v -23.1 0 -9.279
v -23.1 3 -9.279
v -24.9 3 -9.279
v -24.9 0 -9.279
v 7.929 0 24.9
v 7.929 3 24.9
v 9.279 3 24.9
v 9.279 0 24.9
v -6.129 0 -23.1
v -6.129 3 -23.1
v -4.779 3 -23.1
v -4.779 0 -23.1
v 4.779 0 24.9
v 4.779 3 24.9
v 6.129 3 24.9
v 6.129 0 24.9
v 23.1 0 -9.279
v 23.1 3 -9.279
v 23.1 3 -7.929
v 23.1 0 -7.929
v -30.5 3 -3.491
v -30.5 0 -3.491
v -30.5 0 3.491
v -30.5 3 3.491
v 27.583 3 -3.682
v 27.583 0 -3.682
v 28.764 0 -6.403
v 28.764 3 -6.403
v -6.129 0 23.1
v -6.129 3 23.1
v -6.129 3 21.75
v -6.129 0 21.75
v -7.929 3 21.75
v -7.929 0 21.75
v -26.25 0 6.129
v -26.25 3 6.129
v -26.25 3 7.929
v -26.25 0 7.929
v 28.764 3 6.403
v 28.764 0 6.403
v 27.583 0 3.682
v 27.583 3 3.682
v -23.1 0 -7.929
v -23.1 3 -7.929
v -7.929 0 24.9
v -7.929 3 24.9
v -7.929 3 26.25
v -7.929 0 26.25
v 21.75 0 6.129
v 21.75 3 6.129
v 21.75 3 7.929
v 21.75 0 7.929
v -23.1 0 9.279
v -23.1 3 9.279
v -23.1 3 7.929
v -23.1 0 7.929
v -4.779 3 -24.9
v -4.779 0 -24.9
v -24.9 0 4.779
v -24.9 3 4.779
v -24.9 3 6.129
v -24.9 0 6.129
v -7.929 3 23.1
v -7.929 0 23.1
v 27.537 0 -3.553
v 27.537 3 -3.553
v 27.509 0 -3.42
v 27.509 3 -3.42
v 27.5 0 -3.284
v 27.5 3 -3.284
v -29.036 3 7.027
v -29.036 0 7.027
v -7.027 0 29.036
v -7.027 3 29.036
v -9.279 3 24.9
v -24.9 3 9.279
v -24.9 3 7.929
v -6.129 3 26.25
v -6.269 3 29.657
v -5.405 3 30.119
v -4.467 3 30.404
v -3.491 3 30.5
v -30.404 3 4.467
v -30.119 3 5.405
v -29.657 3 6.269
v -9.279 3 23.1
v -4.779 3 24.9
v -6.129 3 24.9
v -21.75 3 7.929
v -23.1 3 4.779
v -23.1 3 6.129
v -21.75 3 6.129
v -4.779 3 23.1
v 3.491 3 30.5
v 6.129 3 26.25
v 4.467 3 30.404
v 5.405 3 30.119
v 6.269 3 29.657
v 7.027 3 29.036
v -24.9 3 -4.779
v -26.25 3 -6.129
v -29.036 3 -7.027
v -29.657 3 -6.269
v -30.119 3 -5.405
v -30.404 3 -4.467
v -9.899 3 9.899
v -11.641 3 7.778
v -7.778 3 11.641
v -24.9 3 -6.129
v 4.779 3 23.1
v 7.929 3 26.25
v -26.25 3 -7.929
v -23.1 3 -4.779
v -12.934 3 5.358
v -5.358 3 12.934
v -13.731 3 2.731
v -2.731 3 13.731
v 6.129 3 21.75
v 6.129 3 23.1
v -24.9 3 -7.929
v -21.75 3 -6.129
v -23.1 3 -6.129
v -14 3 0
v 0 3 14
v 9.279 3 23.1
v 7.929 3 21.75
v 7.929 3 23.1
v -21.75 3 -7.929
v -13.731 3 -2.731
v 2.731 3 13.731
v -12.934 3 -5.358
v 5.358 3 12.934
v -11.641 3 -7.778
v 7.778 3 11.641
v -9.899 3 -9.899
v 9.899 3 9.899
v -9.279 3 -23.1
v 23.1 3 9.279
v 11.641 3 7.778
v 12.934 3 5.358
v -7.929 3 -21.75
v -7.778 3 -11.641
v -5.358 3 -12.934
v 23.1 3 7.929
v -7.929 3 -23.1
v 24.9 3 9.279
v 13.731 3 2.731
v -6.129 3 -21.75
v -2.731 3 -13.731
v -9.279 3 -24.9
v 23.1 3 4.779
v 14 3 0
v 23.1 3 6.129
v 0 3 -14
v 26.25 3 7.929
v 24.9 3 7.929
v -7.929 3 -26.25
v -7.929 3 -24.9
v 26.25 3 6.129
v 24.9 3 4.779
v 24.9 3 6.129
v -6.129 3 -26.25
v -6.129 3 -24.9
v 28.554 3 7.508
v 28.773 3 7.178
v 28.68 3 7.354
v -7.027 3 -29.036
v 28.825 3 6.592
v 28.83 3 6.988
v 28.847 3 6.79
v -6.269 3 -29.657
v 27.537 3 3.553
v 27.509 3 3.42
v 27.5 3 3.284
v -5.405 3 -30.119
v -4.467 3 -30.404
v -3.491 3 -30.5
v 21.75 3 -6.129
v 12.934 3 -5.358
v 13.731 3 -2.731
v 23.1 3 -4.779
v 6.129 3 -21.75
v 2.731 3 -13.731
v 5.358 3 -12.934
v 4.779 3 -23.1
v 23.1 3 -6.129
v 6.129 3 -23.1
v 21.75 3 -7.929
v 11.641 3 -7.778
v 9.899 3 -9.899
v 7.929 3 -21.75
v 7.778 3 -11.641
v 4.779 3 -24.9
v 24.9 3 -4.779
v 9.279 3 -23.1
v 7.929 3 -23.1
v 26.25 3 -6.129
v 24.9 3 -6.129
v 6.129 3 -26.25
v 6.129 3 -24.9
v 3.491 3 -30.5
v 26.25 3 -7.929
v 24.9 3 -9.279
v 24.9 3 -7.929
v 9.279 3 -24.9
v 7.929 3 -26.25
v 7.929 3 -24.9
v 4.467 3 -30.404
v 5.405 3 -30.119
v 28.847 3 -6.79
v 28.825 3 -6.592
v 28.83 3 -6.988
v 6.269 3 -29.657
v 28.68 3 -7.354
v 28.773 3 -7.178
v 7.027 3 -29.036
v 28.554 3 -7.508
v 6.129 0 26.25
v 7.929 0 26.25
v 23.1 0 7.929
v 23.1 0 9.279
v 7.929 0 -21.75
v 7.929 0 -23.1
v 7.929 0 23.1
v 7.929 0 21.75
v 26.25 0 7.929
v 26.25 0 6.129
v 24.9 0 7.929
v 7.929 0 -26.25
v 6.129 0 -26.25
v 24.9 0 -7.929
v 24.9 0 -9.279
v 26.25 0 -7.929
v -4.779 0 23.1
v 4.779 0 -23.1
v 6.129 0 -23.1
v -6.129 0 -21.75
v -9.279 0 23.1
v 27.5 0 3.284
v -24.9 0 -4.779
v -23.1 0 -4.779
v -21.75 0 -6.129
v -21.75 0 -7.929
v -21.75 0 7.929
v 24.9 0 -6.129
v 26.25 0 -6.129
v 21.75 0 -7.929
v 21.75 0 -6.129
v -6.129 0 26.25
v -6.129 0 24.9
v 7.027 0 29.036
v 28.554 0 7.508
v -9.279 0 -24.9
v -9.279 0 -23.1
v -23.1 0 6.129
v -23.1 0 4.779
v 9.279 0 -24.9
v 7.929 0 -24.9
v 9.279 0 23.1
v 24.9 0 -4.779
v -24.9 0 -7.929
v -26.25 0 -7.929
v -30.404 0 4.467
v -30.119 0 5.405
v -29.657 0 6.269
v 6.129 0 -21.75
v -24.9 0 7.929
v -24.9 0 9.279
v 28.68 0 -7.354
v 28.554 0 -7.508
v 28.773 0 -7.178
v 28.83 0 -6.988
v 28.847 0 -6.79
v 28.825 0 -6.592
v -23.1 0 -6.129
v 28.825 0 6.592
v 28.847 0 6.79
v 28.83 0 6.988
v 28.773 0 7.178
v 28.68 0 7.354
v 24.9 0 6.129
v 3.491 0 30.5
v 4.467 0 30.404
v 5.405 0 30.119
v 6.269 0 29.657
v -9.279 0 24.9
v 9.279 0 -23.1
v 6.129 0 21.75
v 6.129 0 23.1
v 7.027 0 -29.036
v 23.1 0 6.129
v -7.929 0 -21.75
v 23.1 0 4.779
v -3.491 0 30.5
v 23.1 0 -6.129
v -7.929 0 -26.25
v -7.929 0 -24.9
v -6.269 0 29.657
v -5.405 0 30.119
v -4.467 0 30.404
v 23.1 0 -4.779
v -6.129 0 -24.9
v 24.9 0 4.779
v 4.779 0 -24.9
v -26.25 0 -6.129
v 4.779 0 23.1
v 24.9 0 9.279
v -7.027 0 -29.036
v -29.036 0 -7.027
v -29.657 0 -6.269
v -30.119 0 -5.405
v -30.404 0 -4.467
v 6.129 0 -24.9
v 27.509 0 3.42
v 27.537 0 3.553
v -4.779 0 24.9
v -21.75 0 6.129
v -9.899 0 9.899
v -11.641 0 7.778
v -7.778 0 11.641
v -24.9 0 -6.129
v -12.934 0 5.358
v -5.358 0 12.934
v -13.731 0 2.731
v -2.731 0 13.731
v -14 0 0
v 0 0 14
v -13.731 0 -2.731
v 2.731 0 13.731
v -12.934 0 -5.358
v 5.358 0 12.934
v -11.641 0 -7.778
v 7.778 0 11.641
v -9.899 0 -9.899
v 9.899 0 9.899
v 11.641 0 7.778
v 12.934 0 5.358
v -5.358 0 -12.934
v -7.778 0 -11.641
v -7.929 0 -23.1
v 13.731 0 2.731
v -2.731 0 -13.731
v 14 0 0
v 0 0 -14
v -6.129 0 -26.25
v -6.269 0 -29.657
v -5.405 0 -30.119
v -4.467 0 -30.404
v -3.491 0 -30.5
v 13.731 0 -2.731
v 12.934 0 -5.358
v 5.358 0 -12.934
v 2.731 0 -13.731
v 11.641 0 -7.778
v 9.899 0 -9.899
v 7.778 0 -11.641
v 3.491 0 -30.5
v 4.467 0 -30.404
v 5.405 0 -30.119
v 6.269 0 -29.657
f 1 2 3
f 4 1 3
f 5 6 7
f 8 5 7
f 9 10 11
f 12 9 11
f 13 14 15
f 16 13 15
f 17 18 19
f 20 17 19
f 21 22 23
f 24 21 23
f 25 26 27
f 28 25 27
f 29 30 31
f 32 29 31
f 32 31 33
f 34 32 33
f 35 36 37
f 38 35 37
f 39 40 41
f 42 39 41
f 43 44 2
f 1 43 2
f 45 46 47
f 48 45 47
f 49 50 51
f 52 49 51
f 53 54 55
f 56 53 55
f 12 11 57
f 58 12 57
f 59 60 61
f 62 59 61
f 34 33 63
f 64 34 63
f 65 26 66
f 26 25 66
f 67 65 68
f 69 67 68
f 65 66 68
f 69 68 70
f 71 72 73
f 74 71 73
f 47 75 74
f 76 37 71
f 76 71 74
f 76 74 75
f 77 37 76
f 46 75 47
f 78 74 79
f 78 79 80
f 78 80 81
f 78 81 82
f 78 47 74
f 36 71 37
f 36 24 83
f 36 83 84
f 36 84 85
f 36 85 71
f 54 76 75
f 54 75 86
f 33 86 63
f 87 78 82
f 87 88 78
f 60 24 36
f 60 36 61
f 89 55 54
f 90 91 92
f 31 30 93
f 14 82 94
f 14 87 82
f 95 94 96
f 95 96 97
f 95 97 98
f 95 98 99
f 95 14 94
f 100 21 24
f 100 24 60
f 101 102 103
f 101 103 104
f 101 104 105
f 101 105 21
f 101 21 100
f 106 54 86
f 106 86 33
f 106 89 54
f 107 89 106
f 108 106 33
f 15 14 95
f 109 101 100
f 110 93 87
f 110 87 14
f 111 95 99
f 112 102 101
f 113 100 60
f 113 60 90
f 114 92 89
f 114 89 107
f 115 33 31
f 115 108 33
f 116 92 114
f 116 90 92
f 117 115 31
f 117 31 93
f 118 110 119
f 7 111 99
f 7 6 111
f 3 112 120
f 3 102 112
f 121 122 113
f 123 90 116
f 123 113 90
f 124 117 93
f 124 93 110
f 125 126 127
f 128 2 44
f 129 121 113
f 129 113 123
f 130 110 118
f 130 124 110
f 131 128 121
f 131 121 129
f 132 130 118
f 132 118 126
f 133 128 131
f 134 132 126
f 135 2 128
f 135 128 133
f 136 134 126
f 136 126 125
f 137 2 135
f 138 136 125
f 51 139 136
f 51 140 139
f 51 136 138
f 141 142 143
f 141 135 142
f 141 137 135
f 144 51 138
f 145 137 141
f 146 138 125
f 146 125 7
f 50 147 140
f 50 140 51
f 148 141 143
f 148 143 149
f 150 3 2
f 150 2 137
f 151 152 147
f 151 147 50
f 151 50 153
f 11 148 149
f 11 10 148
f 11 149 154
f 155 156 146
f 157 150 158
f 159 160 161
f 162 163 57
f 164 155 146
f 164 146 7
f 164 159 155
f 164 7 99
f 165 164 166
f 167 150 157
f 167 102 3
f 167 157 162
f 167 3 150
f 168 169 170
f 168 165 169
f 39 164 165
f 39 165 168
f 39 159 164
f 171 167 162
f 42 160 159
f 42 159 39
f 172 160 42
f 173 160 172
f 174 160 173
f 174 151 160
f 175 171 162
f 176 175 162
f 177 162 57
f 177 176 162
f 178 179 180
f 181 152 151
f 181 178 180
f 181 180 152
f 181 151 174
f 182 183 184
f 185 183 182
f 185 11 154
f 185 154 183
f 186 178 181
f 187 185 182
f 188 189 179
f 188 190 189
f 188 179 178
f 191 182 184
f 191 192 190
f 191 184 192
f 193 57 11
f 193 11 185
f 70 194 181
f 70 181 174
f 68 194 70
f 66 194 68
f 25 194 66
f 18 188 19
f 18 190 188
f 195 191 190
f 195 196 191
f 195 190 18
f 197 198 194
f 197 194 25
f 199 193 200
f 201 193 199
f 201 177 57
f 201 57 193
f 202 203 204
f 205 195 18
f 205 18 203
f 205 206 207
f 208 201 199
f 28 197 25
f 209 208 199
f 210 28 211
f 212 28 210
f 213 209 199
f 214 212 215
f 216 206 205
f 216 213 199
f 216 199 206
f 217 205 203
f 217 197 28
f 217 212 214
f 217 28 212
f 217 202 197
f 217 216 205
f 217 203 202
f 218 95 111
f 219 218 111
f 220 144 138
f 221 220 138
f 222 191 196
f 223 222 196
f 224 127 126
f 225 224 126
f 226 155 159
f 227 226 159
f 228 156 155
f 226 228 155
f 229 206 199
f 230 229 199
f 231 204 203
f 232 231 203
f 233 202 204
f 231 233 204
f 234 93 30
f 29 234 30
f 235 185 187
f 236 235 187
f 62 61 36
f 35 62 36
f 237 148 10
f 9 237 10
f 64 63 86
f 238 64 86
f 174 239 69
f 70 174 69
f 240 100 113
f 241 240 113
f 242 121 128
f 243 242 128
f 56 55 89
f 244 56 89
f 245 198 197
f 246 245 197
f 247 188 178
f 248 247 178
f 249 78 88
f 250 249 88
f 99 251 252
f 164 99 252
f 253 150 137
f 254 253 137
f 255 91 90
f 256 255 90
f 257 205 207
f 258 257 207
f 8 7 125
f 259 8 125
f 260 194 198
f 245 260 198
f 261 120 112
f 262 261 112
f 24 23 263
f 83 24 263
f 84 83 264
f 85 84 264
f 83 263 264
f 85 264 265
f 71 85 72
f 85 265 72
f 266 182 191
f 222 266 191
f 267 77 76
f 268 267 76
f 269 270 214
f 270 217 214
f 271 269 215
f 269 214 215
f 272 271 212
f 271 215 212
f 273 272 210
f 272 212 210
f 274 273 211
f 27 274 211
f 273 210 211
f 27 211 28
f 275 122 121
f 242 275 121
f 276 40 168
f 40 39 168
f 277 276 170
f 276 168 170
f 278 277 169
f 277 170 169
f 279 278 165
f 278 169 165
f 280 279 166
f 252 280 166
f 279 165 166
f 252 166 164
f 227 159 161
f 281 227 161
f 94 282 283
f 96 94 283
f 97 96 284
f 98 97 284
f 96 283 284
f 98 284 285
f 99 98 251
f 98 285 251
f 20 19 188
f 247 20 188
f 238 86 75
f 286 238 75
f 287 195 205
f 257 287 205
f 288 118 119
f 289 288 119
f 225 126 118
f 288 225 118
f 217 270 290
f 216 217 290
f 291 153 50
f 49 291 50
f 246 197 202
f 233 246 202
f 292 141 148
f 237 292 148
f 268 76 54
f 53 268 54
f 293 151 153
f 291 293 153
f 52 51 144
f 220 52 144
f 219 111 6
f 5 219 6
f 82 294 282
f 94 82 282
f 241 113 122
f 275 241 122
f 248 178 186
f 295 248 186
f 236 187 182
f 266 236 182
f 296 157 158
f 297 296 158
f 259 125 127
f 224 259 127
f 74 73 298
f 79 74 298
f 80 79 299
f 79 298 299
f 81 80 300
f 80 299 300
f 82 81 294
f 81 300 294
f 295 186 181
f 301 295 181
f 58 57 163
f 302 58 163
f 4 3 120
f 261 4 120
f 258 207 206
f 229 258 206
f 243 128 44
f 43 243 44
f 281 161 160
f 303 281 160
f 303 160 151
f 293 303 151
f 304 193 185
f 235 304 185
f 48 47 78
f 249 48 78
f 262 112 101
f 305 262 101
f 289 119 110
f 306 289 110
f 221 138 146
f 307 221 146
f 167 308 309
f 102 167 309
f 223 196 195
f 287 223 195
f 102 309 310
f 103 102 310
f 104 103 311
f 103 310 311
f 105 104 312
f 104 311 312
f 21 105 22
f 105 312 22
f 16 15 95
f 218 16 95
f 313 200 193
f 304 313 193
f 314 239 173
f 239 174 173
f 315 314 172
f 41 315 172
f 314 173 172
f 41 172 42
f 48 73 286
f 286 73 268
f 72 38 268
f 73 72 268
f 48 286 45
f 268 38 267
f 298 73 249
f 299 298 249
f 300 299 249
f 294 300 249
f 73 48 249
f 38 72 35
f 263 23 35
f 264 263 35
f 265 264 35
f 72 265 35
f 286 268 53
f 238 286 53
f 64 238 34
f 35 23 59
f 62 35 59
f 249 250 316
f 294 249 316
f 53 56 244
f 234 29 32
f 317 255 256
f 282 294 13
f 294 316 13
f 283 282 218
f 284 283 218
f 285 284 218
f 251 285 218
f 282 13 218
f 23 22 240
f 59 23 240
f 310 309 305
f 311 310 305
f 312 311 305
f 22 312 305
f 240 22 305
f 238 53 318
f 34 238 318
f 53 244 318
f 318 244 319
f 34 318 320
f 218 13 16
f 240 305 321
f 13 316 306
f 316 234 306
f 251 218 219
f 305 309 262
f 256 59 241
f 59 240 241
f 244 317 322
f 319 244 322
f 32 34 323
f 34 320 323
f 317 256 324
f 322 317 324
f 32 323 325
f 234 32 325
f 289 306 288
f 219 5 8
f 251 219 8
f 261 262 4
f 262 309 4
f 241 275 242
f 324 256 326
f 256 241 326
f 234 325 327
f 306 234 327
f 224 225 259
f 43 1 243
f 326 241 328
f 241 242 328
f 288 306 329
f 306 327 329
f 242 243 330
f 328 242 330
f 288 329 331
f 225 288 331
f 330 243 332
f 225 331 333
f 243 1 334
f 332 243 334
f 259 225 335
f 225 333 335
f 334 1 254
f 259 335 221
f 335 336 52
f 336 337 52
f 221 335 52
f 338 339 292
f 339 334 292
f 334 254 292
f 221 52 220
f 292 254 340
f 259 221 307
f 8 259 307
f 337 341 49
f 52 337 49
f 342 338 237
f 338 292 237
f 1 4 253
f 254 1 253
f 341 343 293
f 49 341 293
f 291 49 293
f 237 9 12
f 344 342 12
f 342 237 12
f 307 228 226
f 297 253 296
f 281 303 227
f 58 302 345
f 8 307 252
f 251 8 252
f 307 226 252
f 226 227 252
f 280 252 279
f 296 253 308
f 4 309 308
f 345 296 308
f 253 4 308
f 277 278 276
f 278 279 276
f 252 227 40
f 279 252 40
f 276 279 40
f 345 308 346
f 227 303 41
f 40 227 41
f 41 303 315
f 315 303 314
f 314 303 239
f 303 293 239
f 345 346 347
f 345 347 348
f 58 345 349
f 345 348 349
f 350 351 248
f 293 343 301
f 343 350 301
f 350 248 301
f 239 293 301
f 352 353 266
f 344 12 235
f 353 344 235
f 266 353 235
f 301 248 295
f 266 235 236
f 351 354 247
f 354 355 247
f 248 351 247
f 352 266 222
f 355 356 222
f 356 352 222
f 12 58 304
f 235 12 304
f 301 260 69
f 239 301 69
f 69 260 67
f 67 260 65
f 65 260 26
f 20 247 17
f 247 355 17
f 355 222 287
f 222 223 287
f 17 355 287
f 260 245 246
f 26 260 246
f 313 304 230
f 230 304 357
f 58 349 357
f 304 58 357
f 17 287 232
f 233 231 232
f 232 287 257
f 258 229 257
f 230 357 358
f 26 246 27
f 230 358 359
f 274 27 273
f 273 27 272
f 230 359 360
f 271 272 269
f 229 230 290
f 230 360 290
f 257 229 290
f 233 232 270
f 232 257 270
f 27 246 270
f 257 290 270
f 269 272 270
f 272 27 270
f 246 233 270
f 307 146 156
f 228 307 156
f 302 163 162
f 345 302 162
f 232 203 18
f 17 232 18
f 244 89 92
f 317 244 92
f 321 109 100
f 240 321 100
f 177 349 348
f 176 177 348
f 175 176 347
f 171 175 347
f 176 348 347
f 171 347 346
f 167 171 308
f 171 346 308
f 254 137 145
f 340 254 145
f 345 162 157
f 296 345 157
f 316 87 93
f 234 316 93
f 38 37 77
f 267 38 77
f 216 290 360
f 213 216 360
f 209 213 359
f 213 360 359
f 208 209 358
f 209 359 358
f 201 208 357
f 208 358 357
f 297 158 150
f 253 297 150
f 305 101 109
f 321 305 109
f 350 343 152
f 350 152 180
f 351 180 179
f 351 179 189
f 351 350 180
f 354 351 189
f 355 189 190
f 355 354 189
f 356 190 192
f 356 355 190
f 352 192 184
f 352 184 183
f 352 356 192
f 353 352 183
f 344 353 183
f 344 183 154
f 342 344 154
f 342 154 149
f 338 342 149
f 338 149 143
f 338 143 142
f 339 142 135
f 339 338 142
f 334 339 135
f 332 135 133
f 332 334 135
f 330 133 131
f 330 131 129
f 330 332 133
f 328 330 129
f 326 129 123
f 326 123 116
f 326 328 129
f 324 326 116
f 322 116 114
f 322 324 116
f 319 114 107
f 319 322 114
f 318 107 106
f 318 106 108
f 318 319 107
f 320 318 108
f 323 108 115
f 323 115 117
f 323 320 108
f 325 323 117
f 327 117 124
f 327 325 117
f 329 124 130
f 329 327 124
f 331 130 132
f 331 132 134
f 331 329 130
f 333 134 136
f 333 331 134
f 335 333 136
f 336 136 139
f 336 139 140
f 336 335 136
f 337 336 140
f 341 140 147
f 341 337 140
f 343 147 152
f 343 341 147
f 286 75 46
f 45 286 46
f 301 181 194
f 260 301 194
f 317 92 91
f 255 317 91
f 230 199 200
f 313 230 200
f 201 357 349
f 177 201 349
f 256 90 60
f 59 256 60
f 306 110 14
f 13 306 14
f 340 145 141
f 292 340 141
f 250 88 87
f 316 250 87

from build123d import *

# Parameters (mm, degrees)
SKETCH1_R           = 14
BOSS_EXTRUDE1_DEPTH = 3
CUT_EXTRUDE1_DEPTH  = 4
FILLET1_R           = 1


with BuildPart() as part:
    # Sketch1 → Boss-Extrude1 (new body)
    with BuildSketch(Plane(origin=(0, 0, 0), x_dir=(1, 0, 0), z_dir=(0, 1, 0))):
        with BuildLine():
            Line((3.491378029, 30.5), (-3.491378029, 30.5))
            ThreePointArc((-3.491378029, 30.5), (-5.40479519, 30.119397663), (-7.026911935, 29.035533906))
            Line((-7.026911935, 29.035533906), (-29.035533906, 7.026911935))
            ThreePointArc((-29.035533906, 7.026911935), (-30.119397663, 5.40479519), (-30.5, 3.491378029))
            Line((-30.5, 3.491378029), (-30.5, -3.491378029))
            ThreePointArc((-30.5, -3.491378029), (-30.119397663, -5.40479519), (-29.035533906, -7.026911935))
            Line((-29.035533906, -7.026911935), (-7.026911935, -29.035533906))
            ThreePointArc((-7.026911935, -29.035533906), (-5.40479519, -30.119397663), (-3.491378029, -30.5))
            Line((-3.491378029, -30.5), (3.491378029, -30.5))
            ThreePointArc((3.491378029, -30.5), (5.40479519, -30.119397663), (7.026911935, -29.035533906))
            Line((7.026911935, -29.035533906), (29.035533906, -7.026911935))
            Line((29.035533906, -7.026911935), (27.5, -3.491378029))
            Line((27.5, -3.491378029), (27.5, 3.491378029))
            Line((27.5, 3.491378029), (29.035533906, 7.026911935))
            Line((29.035533906, 7.026911935), (7.026911935, 29.035533906))
            ThreePointArc((7.026911935, 29.035533906), (5.40479519, 30.119397663), (3.491378029, 30.5))
        make_face()
        Circle(SKETCH1_R, mode=Mode.SUBTRACT)
    extrude(amount=BOSS_EXTRUDE1_DEPTH)

    # Sketch2 → Cut-Extrude1 (cut, through all)
    with BuildSketch(Plane(origin=(0, 3, 0), x_dir=(1, 0, 0), z_dir=(0, 1, 0))):
        Polygon((-26.25, 7.929437252), (-26.25, 6.129437252), (-24.9, 6.129437252), (-24.9, 4.779437252), (-23.1, 4.779437252), (-23.1, 6.129437252), (-21.75, 6.129437252), (-21.75, 7.929437252), (-23.1, 7.929437252), (-23.1, 9.279437252), (-24.9, 9.279437252), (-24.9, 7.929437252), align=None)
        Polygon((-23.1, -4.779437252), (-24.9, -4.779437252), (-24.9, -6.129437252), (-26.25, -6.129437252), (-26.25, -7.929437252), (-24.9, -7.929437252), (-24.9, -9.279437252), (-23.1, -9.279437252), (-23.1, -7.929437252), (-21.75, -7.929437252), (-21.75, -6.129437252), (-23.1, -6.129437252), align=None)
        Polygon((7.929437252, 23.1), (9.279437252, 23.1), (9.279437252, 24.9), (7.929437252, 24.9), (7.929437252, 26.25), (6.129437252, 26.25), (6.129437252, 24.9), (4.779437252, 24.9), (4.779437252, 23.1), (6.129437252, 23.1), (6.129437252, 21.75), (7.929437252, 21.75), align=None)
        Polygon((26.25, -7.929437252), (26.25, -6.129437252), (24.9, -6.129437252), (24.9, -4.779437252), (23.1, -4.779437252), (23.1, -6.129437252), (21.75, -6.129437252), (21.75, -7.929437252), (23.1, -7.929437252), (23.1, -9.279437252), (24.9, -9.279437252), (24.9, -7.929437252), align=None)
        Polygon((-4.779437252, 24.9), (-6.129437252, 24.9), (-6.129437252, 26.25), (-7.929437252, 26.25), (-7.929437252, 24.9), (-9.279437252, 24.9), (-9.279437252, 23.1), (-7.929437252, 23.1), (-7.929437252, 21.75), (-6.129437252, 21.75), (-6.129437252, 23.1), (-4.779437252, 23.1), align=None)
        Polygon((26.25, 7.929437252), (24.9, 7.929437252), (24.9, 9.279437252), (23.1, 9.279437252), (23.1, 7.929437252), (21.75, 7.929437252), (21.75, 6.129437252), (23.1, 6.129437252), (23.1, 4.779437252), (24.9, 4.779437252), (24.9, 6.129437252), (26.25, 6.129437252), align=None)
        Polygon((-6.129437252, -26.25), (-6.129437252, -24.9), (-4.779437252, -24.9), (-4.779437252, -23.1), (-6.129437252, -23.1), (-6.129437252, -21.75), (-7.929437252, -21.75), (-7.929437252, -23.1), (-9.279437252, -23.1), (-9.279437252, -24.9), (-7.929437252, -24.9), (-7.929437252, -26.25), align=None)
        Polygon((7.929437252, -26.25), (7.929437252, -24.9), (9.279437252, -24.9), (9.279437252, -23.1), (7.929437252, -23.1), (7.929437252, -21.75), (6.129437252, -21.75), (6.129437252, -23.1), (4.779437252, -23.1), (4.779437252, -24.9), (6.129437252, -24.9), (6.129437252, -26.25), align=None)
    extrude(amount=-CUT_EXTRUDE1_DEPTH, mode=Mode.SUBTRACT)

    # Fillet1
    fillet1_edges = [part.edges().sort_by_distance(p)[0] for p in [
        (29.035533906, 1.5, -7.026911935),
        (27.5, 1.5, -3.491378029),
        (27.5, 1.5, 3.491378029),
        (29.035533906, 1.5, 7.026911935),
    ]]
    fillet(fillet1_edges, radius=FILLET1_R)


solid = part.part
